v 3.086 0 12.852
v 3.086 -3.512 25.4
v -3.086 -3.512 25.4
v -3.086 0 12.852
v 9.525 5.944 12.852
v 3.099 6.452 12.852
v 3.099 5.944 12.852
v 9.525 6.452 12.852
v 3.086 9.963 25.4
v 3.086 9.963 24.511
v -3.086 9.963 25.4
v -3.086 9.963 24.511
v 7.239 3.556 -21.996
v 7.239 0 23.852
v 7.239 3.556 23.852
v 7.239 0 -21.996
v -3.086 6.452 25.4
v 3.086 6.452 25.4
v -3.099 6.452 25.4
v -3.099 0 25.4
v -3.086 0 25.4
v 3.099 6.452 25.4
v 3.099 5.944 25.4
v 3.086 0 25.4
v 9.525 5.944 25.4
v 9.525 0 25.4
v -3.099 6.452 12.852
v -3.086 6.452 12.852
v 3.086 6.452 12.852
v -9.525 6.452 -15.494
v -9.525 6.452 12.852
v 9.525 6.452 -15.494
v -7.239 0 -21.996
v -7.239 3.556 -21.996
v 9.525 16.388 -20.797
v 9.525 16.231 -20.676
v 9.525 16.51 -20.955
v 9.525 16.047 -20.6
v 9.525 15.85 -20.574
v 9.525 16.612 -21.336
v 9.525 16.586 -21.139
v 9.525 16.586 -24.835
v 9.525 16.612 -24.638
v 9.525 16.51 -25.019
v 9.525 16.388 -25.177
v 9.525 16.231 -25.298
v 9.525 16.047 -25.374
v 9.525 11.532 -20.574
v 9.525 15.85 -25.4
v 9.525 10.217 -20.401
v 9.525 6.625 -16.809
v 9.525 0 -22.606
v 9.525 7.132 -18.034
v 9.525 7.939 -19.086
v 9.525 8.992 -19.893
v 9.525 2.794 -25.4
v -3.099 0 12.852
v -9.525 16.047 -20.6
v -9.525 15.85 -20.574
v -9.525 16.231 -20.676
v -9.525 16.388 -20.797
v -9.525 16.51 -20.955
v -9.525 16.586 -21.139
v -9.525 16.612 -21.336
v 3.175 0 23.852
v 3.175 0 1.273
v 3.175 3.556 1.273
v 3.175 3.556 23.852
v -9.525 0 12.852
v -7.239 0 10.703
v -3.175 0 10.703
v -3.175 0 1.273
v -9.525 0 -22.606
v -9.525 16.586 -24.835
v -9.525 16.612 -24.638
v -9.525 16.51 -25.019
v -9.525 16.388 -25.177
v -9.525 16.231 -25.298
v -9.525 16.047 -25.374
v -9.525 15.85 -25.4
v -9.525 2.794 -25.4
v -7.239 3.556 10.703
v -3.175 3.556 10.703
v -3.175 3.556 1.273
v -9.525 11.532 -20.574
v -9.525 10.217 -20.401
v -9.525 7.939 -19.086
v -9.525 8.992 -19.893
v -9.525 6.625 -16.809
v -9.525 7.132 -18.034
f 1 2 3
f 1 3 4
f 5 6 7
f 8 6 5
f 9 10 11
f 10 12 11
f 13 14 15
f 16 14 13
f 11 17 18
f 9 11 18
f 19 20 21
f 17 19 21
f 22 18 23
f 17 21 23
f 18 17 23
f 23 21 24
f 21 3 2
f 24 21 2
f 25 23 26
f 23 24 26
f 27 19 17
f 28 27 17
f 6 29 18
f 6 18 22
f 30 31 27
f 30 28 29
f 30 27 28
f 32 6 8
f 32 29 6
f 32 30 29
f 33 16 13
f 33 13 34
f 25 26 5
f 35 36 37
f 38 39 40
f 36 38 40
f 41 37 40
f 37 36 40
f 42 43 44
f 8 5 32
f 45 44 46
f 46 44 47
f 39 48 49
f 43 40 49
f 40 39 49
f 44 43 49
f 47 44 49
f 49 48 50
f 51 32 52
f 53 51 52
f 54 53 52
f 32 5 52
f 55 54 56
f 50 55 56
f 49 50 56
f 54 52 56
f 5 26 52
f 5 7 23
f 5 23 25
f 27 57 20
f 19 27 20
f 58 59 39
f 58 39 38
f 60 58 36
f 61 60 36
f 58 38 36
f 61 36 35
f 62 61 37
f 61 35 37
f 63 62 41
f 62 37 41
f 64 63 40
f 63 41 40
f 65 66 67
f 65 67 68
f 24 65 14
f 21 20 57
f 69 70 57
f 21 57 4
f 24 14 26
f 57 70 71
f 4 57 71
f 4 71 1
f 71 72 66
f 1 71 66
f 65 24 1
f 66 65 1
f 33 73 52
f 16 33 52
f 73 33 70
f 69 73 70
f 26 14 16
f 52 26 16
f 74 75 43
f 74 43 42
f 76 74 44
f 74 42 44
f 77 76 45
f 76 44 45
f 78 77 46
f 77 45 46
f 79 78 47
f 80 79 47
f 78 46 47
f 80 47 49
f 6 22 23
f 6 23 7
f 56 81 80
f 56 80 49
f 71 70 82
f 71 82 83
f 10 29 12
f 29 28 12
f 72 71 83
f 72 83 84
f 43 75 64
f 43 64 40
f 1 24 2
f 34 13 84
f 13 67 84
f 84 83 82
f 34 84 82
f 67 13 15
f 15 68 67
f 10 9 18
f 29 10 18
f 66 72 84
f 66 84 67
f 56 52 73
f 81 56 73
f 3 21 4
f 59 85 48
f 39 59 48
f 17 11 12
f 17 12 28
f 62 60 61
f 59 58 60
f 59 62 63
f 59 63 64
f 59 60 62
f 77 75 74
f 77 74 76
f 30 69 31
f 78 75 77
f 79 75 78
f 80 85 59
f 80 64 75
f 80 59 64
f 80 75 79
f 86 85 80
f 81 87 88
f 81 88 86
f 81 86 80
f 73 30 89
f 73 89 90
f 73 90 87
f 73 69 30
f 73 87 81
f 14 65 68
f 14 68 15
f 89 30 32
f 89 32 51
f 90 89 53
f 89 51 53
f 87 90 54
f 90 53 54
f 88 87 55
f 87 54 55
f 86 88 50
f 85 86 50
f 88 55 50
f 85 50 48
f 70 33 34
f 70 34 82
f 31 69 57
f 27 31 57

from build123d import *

# Parameters (mm, degrees)
BOSS_EXTRUDE1_DEPTH = 6.4516
SKETCH2_W           = 19.05
SKETCH2_H           = 4.826
BOSS_EXTRUDE2_DEPTH = 10.16
FILLET1_R           = 5.08
FILLET2_R           = 0.762
SKETCH4_W           = 6.4262
SKETCH4_H           = 12.5476
CUT_EXTRUDE1_DEPTH  = 0.508
BOSS_EXTRUDE3_DEPTH = 3.0861
CHAMFER1_SIZE       = 2.794
CUT_EXTRUDE2_DEPTH  = 3.556


with BuildPart() as part:
    # Sketch1 → Boss-Extrude1 (new body)
    with BuildSketch(Plane(origin=(0, 0, 0), x_dir=(1, 0, 0), z_dir=(0, 1, 0))):
        Polygon((-3.0988, -12.8524), (-3.0988, -25.4), (9.525, -25.4), (9.525, 25.4), (-9.525, 25.4), (-9.525, -12.8524), align=None)
    extrude(amount=BOSS_EXTRUDE1_DEPTH)

    # Sketch2 → Boss-Extrude2 (add)
    with BuildSketch(Plane(origin=(0, 6.4516, 0), x_dir=(1, 0, 0), z_dir=(0, 1, 0))):
        with Locations((0, 22.987)):
            Rectangle(SKETCH2_W, SKETCH2_H)
    extrude(amount=BOSS_EXTRUDE2_DEPTH)

    # Fillet1
    fillet1_edges = [part.edges().sort_by_distance(p)[0] for p in [
        (0, 6.4516, -20.574),
    ]]
    fillet(fillet1_edges, radius=FILLET1_R)

    # Fillet2
    fillet2_edges = [part.edges().sort_by_distance(p)[0] for p in [
        (0, 16.6116, -20.574),
        (0, 16.6116, -25.4),
    ]]
    fillet(fillet2_edges, radius=FILLET2_R)

    # Sketch4 → Cut-Extrude1 (cut)
    with BuildSketch(Plane(origin=(0, 6.4516, 0), x_dir=(1, 0, 0), z_dir=(0, 1, 0))):
        with Locations((6.3119, -19.1262)):
            Rectangle(SKETCH4_W, SKETCH4_H)
    extrude(amount=-CUT_EXTRUDE1_DEPTH, mode=Mode.SUBTRACT)

    # Sketch5 → Boss-Extrude3 (add, symmetric)
    with BuildSketch(Plane(origin=(0, 0, 0), x_dir=(0, 0, -1), z_dir=(1, 0, 0))):
        Polygon((-25.4, 6.4516), (-12.8524, 6.4516), (-24.511, 9.96315), (-25.4, 9.96315), align=None)
        Polygon((-25.4, 0), (-25.4, -3.51155), (-12.8524, 0), align=None)
    extrude(amount=BOSS_EXTRUDE3_DEPTH, both=True)

    # Chamfer1
    chamfer1_edges = [part.edges().sort_by_distance(p)[0] for p in [
        (0, 0, -25.4),
    ]]
    chamfer(chamfer1_edges, length=CHAMFER1_SIZE)

    # Sketch6 → Cut-Extrude2 (cut)
    with BuildSketch(Plane.XZ):
        Polygon((3.175, 23.851678881), (7.239, 23.851678881), (7.239, -21.9964), (-7.239, -21.9964), (-7.239, 10.702998039), (-3.175, 10.702998039), (-3.175, 1.273136021), (3.175, 1.273136021), align=None)
    extrude(amount=-CUT_EXTRUDE2_DEPTH, mode=Mode.SUBTRACT)


solid = part.part
